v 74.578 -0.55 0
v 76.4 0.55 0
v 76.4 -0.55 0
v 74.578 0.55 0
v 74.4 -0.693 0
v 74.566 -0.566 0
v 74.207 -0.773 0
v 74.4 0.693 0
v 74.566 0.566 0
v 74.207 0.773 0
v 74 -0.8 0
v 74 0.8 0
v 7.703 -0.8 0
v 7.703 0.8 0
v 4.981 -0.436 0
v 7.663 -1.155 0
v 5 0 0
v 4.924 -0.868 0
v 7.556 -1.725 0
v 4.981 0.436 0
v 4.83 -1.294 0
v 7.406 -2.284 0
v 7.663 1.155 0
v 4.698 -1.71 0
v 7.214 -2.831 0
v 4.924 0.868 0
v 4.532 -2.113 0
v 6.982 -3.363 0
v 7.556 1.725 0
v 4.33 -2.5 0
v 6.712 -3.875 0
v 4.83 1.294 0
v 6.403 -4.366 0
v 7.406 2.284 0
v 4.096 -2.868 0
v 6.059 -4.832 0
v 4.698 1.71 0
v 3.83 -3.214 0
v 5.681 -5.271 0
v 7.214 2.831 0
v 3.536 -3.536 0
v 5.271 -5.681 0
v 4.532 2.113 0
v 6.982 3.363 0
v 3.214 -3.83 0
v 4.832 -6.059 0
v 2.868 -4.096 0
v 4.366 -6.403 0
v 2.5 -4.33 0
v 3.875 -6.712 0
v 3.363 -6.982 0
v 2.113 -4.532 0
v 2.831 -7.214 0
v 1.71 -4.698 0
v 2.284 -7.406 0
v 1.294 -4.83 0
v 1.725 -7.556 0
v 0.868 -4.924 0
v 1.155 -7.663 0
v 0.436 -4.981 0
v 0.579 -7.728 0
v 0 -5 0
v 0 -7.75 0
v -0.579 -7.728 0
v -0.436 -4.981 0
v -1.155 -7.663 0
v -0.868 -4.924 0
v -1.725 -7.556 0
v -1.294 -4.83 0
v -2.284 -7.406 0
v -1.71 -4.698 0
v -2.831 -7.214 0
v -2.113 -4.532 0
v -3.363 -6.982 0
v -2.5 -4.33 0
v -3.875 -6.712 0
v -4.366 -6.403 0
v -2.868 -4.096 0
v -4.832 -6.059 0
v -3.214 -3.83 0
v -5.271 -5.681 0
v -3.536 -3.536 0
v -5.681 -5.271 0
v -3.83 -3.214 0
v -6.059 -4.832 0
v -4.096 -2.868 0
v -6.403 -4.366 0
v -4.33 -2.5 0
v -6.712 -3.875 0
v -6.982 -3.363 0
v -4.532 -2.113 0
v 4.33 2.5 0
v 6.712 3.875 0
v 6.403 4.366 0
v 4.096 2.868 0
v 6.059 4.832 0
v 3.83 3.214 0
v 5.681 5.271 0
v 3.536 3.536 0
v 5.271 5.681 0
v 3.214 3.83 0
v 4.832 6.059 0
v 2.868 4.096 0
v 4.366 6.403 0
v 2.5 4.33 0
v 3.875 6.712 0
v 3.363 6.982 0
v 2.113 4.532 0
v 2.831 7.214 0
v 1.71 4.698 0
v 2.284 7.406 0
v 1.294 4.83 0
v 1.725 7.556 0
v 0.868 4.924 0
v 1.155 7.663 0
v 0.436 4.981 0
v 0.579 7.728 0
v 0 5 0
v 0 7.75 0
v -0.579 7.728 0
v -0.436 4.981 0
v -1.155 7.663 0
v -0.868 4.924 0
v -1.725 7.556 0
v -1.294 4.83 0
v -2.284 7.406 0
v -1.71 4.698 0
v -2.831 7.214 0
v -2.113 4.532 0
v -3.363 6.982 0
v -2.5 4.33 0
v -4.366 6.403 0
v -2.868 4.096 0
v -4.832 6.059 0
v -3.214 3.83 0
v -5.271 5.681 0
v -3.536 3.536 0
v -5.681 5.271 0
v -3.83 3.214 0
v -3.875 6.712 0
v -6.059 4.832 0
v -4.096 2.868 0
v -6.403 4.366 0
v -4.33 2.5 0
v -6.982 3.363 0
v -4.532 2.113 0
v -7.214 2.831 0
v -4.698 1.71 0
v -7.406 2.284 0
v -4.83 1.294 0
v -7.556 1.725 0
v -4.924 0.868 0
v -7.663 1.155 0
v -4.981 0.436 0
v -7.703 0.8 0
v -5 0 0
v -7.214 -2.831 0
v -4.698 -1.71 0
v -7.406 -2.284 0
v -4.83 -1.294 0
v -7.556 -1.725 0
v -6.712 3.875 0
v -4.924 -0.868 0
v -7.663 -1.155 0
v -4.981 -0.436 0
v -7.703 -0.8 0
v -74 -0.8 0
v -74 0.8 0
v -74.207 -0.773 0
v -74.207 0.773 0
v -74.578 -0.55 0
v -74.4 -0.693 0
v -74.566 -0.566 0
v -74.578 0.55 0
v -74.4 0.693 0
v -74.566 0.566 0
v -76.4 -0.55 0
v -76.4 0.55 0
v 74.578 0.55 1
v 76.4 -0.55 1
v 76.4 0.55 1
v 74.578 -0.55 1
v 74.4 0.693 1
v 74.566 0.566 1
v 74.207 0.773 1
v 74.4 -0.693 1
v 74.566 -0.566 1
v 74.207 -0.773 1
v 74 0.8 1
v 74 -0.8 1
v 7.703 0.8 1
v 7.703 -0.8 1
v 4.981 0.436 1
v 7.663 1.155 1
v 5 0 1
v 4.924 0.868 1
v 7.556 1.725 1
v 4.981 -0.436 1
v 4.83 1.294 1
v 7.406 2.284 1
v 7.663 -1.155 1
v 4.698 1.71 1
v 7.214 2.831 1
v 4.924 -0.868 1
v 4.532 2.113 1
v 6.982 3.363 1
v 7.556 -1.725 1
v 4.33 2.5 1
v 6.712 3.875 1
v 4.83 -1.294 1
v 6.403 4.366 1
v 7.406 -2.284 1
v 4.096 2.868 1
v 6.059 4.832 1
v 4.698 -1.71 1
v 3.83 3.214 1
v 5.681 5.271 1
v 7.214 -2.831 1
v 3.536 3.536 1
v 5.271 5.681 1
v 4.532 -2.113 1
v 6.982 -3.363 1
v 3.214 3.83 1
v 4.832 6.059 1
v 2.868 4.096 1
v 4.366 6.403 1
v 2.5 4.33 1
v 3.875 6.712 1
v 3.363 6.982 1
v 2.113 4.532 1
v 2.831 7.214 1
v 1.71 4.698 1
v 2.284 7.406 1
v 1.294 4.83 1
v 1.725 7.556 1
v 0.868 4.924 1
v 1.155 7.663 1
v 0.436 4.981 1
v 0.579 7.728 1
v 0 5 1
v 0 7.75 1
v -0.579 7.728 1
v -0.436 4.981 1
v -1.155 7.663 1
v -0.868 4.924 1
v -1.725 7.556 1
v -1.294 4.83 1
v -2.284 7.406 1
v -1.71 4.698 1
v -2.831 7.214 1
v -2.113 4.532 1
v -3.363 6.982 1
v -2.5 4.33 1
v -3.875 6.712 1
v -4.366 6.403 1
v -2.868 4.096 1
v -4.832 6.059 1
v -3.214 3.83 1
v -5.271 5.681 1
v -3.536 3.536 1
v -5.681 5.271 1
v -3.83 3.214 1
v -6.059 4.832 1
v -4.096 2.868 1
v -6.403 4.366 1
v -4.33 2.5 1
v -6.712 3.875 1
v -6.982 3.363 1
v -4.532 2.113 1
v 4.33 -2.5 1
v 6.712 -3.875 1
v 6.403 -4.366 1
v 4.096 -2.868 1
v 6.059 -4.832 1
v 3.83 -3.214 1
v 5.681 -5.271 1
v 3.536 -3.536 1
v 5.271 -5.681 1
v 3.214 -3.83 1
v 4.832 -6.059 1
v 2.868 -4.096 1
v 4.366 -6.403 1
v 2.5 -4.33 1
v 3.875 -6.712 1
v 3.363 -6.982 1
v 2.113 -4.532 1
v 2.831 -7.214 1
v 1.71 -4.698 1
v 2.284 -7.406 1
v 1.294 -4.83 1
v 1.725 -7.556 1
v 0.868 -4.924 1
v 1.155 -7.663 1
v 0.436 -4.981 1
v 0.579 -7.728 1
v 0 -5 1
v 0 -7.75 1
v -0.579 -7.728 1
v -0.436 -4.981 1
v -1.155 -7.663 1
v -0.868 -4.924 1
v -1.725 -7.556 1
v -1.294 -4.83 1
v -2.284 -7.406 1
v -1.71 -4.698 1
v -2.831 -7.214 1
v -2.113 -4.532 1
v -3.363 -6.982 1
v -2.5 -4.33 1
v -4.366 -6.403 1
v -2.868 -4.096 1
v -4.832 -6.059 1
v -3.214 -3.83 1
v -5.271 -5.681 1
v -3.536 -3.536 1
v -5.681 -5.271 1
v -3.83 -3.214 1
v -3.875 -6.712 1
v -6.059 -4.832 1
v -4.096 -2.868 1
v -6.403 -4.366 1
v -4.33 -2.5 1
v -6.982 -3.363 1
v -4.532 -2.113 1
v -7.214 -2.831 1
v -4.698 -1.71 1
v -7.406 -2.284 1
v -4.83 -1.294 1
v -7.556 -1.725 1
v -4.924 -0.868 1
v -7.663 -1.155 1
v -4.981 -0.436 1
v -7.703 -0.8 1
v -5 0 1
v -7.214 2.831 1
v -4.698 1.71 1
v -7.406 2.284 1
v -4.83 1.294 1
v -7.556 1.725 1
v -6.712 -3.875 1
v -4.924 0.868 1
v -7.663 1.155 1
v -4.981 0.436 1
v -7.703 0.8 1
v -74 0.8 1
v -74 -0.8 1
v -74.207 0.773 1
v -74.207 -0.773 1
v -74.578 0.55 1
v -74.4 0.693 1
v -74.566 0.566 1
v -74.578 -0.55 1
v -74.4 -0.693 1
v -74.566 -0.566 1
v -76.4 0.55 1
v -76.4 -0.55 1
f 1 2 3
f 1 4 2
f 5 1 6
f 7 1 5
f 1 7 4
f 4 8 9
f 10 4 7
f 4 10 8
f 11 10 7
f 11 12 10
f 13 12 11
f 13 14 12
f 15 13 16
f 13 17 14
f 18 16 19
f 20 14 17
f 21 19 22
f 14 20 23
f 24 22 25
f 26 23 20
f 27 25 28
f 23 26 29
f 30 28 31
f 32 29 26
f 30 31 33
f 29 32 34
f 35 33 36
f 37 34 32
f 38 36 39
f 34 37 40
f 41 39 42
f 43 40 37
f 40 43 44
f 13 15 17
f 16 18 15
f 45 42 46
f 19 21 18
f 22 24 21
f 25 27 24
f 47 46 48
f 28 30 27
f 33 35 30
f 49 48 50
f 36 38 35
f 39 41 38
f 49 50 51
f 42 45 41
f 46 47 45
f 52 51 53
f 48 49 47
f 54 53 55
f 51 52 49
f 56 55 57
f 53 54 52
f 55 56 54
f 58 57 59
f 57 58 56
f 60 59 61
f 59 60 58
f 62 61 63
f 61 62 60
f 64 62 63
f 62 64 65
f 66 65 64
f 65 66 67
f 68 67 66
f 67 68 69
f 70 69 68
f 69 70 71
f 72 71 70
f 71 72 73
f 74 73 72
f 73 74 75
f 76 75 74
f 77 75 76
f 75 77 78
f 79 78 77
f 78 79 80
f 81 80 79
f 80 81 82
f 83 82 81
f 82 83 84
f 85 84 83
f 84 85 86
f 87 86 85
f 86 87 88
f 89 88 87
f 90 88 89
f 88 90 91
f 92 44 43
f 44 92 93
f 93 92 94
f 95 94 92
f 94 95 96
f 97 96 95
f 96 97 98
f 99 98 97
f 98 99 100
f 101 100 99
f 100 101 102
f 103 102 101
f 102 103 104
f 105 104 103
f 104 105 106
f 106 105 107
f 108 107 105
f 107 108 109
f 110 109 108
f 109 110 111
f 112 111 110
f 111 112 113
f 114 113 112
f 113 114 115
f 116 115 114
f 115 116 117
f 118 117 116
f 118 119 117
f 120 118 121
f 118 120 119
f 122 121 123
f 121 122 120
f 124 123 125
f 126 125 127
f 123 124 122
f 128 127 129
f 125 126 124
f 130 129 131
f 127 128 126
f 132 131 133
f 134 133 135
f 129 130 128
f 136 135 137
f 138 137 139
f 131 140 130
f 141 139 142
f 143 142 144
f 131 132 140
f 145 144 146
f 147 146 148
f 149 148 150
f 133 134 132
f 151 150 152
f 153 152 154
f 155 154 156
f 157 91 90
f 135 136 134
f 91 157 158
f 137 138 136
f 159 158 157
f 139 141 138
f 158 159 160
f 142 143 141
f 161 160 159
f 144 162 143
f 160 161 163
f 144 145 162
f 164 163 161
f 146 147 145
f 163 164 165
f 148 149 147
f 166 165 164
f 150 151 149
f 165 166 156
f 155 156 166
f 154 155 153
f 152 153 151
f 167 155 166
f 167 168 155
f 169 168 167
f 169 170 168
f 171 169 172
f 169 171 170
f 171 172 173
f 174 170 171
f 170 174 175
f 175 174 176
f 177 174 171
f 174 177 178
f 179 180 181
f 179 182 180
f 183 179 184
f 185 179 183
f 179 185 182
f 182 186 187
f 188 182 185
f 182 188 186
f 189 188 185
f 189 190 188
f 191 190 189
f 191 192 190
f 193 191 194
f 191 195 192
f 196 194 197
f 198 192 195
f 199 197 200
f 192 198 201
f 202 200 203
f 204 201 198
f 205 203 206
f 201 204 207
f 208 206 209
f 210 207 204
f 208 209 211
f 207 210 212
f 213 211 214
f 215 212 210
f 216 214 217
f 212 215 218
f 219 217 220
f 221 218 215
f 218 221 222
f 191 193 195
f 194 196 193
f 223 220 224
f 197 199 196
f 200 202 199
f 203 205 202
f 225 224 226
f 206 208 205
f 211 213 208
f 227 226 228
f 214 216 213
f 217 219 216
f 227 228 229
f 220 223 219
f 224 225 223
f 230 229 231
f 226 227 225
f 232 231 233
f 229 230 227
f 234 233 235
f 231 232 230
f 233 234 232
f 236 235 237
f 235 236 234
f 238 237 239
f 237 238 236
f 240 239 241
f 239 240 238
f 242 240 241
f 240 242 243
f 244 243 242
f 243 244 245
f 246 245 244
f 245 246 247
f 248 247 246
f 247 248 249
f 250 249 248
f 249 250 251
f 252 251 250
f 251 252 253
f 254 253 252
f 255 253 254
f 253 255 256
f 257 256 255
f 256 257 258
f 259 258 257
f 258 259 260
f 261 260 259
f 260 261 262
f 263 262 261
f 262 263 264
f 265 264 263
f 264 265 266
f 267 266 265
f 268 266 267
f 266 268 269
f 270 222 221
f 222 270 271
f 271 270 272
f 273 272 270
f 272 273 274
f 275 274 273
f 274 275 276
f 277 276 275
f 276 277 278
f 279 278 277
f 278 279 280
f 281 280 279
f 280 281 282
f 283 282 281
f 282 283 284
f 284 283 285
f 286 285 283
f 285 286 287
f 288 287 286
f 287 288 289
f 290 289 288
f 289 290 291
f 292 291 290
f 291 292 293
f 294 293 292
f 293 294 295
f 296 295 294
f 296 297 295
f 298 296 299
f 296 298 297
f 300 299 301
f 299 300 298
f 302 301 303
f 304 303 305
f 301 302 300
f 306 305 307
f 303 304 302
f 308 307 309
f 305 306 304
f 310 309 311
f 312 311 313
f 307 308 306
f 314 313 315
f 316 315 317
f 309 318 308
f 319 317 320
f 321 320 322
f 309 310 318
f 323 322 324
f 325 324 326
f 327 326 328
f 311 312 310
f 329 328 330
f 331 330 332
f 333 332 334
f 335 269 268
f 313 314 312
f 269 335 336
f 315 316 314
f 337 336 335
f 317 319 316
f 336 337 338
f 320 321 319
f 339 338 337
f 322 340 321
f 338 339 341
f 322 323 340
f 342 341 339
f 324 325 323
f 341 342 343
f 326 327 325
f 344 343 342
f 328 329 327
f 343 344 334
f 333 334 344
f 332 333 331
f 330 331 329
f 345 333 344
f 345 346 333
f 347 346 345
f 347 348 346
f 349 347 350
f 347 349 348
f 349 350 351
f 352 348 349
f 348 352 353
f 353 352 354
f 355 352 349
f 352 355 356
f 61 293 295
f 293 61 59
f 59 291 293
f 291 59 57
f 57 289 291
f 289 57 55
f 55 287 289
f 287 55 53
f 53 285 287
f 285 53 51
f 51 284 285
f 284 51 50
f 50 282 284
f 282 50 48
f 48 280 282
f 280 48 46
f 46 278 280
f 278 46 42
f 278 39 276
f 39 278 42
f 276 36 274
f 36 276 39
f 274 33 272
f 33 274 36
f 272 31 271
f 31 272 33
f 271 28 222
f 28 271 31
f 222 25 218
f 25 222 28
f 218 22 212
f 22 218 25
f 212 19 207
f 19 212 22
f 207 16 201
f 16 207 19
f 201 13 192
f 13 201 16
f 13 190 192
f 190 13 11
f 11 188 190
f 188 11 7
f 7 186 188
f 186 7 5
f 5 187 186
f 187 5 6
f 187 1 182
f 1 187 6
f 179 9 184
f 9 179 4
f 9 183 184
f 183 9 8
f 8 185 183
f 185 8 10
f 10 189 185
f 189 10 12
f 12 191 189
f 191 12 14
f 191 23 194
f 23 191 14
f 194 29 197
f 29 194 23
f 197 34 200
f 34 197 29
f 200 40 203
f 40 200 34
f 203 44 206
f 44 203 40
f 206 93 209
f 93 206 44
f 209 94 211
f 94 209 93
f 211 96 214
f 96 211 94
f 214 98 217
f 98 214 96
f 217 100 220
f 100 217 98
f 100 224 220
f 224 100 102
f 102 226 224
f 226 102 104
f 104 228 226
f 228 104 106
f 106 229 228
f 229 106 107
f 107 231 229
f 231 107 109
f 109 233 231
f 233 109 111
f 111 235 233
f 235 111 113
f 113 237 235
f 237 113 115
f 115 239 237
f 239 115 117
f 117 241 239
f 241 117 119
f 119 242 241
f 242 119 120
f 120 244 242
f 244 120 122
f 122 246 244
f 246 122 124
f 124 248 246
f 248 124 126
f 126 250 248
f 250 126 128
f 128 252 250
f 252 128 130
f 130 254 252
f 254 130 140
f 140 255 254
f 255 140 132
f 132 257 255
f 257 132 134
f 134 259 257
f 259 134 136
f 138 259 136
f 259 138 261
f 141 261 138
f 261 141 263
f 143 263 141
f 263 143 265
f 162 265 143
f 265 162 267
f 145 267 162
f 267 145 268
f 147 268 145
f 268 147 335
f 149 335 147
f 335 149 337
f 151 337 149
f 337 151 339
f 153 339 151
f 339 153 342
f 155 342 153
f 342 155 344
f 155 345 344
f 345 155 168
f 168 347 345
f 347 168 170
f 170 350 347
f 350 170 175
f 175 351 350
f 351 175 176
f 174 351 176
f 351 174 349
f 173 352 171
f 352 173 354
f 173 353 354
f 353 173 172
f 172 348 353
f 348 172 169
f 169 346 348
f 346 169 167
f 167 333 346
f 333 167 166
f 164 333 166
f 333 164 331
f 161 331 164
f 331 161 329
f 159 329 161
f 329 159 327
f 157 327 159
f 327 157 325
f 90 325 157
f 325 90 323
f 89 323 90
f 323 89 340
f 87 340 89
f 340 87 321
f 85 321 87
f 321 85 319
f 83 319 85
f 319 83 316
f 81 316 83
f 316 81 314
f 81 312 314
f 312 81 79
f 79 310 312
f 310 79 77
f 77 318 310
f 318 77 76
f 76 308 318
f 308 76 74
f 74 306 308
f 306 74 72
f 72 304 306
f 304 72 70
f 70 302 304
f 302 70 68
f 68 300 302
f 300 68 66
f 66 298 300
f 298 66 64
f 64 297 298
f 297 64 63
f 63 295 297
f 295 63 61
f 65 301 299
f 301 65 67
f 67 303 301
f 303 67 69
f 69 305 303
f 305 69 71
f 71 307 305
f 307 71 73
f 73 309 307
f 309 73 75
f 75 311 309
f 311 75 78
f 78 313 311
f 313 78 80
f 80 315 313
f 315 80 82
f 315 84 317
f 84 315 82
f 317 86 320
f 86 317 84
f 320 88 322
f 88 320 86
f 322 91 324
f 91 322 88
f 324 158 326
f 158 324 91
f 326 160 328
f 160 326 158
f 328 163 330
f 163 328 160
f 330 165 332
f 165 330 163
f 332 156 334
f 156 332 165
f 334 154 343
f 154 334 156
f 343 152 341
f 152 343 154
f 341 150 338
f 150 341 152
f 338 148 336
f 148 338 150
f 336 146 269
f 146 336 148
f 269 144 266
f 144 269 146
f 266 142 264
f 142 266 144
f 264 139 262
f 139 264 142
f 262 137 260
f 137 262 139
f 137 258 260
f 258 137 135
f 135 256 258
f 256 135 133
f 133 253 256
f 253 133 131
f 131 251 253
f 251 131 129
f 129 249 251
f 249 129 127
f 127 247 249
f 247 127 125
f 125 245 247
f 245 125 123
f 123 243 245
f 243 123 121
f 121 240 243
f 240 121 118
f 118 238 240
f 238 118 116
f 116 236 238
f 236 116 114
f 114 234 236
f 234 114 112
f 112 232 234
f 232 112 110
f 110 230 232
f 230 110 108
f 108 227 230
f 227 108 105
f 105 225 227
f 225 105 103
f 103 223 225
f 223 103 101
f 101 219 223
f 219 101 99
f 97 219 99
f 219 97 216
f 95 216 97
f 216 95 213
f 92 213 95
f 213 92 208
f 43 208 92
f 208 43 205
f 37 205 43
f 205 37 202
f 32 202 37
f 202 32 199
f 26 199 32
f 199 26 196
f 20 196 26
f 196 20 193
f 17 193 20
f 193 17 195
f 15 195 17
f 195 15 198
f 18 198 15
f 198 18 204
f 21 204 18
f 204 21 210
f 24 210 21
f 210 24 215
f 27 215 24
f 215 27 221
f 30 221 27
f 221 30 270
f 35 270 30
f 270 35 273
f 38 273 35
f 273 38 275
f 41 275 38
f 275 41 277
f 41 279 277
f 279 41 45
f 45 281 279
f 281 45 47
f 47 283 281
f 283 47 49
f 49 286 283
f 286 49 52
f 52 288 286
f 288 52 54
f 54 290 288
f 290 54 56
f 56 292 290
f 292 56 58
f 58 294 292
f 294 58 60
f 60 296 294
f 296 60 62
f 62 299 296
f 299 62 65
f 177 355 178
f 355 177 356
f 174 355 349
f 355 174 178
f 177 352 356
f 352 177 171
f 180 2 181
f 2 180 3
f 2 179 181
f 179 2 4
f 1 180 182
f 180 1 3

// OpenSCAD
// part_id: fp10
// name: Zodiac angle measurement pointer
// source_drawing_ids: DRW-010
// units: mm
// revision: 0.1
// SPDX-License-Identifier: MIT

module fp10_profile_2d(
    arm_len = 74.0,
    arm_w = 1.6,
    hub_od = 15.5,
    hub_id = 10.0
) {
    difference() {
        union() {
            hull() {
                translate([-arm_len, 0]) circle(d = arm_w, $fn = 24);
                circle(d = arm_w, $fn = 24);
            }
            hull() {
                translate([arm_len, 0]) circle(d = arm_w, $fn = 24);
                circle(d = arm_w, $fn = 24);
            }
            circle(d = hub_od, $fn = 84);
        }
        circle(d = hub_id, $fn = 72);
    }
}

module part_fp10(
    thickness = 1.0,
    end_hook_l = 2.4,
    end_hook_h = 1.0
) {
    linear_extrude(height = thickness) fp10_profile_2d();

    // End return tabs to match the bent pointer ends shown in DRW-010 sheet 9.
    translate([-74.0 - end_hook_l, -0.55, thickness - end_hook_h])
        cube([end_hook_l, 1.1, end_hook_h], center = false);
    translate([74.0, -0.55, thickness - end_hook_h])
        cube([end_hook_l, 1.1, end_hook_h], center = false);
}

// ---- "main guard" ----
// Default to previewing when opened directly:
if (is_undef(__LIB_MODE__)) {
    part_fp10();
}
